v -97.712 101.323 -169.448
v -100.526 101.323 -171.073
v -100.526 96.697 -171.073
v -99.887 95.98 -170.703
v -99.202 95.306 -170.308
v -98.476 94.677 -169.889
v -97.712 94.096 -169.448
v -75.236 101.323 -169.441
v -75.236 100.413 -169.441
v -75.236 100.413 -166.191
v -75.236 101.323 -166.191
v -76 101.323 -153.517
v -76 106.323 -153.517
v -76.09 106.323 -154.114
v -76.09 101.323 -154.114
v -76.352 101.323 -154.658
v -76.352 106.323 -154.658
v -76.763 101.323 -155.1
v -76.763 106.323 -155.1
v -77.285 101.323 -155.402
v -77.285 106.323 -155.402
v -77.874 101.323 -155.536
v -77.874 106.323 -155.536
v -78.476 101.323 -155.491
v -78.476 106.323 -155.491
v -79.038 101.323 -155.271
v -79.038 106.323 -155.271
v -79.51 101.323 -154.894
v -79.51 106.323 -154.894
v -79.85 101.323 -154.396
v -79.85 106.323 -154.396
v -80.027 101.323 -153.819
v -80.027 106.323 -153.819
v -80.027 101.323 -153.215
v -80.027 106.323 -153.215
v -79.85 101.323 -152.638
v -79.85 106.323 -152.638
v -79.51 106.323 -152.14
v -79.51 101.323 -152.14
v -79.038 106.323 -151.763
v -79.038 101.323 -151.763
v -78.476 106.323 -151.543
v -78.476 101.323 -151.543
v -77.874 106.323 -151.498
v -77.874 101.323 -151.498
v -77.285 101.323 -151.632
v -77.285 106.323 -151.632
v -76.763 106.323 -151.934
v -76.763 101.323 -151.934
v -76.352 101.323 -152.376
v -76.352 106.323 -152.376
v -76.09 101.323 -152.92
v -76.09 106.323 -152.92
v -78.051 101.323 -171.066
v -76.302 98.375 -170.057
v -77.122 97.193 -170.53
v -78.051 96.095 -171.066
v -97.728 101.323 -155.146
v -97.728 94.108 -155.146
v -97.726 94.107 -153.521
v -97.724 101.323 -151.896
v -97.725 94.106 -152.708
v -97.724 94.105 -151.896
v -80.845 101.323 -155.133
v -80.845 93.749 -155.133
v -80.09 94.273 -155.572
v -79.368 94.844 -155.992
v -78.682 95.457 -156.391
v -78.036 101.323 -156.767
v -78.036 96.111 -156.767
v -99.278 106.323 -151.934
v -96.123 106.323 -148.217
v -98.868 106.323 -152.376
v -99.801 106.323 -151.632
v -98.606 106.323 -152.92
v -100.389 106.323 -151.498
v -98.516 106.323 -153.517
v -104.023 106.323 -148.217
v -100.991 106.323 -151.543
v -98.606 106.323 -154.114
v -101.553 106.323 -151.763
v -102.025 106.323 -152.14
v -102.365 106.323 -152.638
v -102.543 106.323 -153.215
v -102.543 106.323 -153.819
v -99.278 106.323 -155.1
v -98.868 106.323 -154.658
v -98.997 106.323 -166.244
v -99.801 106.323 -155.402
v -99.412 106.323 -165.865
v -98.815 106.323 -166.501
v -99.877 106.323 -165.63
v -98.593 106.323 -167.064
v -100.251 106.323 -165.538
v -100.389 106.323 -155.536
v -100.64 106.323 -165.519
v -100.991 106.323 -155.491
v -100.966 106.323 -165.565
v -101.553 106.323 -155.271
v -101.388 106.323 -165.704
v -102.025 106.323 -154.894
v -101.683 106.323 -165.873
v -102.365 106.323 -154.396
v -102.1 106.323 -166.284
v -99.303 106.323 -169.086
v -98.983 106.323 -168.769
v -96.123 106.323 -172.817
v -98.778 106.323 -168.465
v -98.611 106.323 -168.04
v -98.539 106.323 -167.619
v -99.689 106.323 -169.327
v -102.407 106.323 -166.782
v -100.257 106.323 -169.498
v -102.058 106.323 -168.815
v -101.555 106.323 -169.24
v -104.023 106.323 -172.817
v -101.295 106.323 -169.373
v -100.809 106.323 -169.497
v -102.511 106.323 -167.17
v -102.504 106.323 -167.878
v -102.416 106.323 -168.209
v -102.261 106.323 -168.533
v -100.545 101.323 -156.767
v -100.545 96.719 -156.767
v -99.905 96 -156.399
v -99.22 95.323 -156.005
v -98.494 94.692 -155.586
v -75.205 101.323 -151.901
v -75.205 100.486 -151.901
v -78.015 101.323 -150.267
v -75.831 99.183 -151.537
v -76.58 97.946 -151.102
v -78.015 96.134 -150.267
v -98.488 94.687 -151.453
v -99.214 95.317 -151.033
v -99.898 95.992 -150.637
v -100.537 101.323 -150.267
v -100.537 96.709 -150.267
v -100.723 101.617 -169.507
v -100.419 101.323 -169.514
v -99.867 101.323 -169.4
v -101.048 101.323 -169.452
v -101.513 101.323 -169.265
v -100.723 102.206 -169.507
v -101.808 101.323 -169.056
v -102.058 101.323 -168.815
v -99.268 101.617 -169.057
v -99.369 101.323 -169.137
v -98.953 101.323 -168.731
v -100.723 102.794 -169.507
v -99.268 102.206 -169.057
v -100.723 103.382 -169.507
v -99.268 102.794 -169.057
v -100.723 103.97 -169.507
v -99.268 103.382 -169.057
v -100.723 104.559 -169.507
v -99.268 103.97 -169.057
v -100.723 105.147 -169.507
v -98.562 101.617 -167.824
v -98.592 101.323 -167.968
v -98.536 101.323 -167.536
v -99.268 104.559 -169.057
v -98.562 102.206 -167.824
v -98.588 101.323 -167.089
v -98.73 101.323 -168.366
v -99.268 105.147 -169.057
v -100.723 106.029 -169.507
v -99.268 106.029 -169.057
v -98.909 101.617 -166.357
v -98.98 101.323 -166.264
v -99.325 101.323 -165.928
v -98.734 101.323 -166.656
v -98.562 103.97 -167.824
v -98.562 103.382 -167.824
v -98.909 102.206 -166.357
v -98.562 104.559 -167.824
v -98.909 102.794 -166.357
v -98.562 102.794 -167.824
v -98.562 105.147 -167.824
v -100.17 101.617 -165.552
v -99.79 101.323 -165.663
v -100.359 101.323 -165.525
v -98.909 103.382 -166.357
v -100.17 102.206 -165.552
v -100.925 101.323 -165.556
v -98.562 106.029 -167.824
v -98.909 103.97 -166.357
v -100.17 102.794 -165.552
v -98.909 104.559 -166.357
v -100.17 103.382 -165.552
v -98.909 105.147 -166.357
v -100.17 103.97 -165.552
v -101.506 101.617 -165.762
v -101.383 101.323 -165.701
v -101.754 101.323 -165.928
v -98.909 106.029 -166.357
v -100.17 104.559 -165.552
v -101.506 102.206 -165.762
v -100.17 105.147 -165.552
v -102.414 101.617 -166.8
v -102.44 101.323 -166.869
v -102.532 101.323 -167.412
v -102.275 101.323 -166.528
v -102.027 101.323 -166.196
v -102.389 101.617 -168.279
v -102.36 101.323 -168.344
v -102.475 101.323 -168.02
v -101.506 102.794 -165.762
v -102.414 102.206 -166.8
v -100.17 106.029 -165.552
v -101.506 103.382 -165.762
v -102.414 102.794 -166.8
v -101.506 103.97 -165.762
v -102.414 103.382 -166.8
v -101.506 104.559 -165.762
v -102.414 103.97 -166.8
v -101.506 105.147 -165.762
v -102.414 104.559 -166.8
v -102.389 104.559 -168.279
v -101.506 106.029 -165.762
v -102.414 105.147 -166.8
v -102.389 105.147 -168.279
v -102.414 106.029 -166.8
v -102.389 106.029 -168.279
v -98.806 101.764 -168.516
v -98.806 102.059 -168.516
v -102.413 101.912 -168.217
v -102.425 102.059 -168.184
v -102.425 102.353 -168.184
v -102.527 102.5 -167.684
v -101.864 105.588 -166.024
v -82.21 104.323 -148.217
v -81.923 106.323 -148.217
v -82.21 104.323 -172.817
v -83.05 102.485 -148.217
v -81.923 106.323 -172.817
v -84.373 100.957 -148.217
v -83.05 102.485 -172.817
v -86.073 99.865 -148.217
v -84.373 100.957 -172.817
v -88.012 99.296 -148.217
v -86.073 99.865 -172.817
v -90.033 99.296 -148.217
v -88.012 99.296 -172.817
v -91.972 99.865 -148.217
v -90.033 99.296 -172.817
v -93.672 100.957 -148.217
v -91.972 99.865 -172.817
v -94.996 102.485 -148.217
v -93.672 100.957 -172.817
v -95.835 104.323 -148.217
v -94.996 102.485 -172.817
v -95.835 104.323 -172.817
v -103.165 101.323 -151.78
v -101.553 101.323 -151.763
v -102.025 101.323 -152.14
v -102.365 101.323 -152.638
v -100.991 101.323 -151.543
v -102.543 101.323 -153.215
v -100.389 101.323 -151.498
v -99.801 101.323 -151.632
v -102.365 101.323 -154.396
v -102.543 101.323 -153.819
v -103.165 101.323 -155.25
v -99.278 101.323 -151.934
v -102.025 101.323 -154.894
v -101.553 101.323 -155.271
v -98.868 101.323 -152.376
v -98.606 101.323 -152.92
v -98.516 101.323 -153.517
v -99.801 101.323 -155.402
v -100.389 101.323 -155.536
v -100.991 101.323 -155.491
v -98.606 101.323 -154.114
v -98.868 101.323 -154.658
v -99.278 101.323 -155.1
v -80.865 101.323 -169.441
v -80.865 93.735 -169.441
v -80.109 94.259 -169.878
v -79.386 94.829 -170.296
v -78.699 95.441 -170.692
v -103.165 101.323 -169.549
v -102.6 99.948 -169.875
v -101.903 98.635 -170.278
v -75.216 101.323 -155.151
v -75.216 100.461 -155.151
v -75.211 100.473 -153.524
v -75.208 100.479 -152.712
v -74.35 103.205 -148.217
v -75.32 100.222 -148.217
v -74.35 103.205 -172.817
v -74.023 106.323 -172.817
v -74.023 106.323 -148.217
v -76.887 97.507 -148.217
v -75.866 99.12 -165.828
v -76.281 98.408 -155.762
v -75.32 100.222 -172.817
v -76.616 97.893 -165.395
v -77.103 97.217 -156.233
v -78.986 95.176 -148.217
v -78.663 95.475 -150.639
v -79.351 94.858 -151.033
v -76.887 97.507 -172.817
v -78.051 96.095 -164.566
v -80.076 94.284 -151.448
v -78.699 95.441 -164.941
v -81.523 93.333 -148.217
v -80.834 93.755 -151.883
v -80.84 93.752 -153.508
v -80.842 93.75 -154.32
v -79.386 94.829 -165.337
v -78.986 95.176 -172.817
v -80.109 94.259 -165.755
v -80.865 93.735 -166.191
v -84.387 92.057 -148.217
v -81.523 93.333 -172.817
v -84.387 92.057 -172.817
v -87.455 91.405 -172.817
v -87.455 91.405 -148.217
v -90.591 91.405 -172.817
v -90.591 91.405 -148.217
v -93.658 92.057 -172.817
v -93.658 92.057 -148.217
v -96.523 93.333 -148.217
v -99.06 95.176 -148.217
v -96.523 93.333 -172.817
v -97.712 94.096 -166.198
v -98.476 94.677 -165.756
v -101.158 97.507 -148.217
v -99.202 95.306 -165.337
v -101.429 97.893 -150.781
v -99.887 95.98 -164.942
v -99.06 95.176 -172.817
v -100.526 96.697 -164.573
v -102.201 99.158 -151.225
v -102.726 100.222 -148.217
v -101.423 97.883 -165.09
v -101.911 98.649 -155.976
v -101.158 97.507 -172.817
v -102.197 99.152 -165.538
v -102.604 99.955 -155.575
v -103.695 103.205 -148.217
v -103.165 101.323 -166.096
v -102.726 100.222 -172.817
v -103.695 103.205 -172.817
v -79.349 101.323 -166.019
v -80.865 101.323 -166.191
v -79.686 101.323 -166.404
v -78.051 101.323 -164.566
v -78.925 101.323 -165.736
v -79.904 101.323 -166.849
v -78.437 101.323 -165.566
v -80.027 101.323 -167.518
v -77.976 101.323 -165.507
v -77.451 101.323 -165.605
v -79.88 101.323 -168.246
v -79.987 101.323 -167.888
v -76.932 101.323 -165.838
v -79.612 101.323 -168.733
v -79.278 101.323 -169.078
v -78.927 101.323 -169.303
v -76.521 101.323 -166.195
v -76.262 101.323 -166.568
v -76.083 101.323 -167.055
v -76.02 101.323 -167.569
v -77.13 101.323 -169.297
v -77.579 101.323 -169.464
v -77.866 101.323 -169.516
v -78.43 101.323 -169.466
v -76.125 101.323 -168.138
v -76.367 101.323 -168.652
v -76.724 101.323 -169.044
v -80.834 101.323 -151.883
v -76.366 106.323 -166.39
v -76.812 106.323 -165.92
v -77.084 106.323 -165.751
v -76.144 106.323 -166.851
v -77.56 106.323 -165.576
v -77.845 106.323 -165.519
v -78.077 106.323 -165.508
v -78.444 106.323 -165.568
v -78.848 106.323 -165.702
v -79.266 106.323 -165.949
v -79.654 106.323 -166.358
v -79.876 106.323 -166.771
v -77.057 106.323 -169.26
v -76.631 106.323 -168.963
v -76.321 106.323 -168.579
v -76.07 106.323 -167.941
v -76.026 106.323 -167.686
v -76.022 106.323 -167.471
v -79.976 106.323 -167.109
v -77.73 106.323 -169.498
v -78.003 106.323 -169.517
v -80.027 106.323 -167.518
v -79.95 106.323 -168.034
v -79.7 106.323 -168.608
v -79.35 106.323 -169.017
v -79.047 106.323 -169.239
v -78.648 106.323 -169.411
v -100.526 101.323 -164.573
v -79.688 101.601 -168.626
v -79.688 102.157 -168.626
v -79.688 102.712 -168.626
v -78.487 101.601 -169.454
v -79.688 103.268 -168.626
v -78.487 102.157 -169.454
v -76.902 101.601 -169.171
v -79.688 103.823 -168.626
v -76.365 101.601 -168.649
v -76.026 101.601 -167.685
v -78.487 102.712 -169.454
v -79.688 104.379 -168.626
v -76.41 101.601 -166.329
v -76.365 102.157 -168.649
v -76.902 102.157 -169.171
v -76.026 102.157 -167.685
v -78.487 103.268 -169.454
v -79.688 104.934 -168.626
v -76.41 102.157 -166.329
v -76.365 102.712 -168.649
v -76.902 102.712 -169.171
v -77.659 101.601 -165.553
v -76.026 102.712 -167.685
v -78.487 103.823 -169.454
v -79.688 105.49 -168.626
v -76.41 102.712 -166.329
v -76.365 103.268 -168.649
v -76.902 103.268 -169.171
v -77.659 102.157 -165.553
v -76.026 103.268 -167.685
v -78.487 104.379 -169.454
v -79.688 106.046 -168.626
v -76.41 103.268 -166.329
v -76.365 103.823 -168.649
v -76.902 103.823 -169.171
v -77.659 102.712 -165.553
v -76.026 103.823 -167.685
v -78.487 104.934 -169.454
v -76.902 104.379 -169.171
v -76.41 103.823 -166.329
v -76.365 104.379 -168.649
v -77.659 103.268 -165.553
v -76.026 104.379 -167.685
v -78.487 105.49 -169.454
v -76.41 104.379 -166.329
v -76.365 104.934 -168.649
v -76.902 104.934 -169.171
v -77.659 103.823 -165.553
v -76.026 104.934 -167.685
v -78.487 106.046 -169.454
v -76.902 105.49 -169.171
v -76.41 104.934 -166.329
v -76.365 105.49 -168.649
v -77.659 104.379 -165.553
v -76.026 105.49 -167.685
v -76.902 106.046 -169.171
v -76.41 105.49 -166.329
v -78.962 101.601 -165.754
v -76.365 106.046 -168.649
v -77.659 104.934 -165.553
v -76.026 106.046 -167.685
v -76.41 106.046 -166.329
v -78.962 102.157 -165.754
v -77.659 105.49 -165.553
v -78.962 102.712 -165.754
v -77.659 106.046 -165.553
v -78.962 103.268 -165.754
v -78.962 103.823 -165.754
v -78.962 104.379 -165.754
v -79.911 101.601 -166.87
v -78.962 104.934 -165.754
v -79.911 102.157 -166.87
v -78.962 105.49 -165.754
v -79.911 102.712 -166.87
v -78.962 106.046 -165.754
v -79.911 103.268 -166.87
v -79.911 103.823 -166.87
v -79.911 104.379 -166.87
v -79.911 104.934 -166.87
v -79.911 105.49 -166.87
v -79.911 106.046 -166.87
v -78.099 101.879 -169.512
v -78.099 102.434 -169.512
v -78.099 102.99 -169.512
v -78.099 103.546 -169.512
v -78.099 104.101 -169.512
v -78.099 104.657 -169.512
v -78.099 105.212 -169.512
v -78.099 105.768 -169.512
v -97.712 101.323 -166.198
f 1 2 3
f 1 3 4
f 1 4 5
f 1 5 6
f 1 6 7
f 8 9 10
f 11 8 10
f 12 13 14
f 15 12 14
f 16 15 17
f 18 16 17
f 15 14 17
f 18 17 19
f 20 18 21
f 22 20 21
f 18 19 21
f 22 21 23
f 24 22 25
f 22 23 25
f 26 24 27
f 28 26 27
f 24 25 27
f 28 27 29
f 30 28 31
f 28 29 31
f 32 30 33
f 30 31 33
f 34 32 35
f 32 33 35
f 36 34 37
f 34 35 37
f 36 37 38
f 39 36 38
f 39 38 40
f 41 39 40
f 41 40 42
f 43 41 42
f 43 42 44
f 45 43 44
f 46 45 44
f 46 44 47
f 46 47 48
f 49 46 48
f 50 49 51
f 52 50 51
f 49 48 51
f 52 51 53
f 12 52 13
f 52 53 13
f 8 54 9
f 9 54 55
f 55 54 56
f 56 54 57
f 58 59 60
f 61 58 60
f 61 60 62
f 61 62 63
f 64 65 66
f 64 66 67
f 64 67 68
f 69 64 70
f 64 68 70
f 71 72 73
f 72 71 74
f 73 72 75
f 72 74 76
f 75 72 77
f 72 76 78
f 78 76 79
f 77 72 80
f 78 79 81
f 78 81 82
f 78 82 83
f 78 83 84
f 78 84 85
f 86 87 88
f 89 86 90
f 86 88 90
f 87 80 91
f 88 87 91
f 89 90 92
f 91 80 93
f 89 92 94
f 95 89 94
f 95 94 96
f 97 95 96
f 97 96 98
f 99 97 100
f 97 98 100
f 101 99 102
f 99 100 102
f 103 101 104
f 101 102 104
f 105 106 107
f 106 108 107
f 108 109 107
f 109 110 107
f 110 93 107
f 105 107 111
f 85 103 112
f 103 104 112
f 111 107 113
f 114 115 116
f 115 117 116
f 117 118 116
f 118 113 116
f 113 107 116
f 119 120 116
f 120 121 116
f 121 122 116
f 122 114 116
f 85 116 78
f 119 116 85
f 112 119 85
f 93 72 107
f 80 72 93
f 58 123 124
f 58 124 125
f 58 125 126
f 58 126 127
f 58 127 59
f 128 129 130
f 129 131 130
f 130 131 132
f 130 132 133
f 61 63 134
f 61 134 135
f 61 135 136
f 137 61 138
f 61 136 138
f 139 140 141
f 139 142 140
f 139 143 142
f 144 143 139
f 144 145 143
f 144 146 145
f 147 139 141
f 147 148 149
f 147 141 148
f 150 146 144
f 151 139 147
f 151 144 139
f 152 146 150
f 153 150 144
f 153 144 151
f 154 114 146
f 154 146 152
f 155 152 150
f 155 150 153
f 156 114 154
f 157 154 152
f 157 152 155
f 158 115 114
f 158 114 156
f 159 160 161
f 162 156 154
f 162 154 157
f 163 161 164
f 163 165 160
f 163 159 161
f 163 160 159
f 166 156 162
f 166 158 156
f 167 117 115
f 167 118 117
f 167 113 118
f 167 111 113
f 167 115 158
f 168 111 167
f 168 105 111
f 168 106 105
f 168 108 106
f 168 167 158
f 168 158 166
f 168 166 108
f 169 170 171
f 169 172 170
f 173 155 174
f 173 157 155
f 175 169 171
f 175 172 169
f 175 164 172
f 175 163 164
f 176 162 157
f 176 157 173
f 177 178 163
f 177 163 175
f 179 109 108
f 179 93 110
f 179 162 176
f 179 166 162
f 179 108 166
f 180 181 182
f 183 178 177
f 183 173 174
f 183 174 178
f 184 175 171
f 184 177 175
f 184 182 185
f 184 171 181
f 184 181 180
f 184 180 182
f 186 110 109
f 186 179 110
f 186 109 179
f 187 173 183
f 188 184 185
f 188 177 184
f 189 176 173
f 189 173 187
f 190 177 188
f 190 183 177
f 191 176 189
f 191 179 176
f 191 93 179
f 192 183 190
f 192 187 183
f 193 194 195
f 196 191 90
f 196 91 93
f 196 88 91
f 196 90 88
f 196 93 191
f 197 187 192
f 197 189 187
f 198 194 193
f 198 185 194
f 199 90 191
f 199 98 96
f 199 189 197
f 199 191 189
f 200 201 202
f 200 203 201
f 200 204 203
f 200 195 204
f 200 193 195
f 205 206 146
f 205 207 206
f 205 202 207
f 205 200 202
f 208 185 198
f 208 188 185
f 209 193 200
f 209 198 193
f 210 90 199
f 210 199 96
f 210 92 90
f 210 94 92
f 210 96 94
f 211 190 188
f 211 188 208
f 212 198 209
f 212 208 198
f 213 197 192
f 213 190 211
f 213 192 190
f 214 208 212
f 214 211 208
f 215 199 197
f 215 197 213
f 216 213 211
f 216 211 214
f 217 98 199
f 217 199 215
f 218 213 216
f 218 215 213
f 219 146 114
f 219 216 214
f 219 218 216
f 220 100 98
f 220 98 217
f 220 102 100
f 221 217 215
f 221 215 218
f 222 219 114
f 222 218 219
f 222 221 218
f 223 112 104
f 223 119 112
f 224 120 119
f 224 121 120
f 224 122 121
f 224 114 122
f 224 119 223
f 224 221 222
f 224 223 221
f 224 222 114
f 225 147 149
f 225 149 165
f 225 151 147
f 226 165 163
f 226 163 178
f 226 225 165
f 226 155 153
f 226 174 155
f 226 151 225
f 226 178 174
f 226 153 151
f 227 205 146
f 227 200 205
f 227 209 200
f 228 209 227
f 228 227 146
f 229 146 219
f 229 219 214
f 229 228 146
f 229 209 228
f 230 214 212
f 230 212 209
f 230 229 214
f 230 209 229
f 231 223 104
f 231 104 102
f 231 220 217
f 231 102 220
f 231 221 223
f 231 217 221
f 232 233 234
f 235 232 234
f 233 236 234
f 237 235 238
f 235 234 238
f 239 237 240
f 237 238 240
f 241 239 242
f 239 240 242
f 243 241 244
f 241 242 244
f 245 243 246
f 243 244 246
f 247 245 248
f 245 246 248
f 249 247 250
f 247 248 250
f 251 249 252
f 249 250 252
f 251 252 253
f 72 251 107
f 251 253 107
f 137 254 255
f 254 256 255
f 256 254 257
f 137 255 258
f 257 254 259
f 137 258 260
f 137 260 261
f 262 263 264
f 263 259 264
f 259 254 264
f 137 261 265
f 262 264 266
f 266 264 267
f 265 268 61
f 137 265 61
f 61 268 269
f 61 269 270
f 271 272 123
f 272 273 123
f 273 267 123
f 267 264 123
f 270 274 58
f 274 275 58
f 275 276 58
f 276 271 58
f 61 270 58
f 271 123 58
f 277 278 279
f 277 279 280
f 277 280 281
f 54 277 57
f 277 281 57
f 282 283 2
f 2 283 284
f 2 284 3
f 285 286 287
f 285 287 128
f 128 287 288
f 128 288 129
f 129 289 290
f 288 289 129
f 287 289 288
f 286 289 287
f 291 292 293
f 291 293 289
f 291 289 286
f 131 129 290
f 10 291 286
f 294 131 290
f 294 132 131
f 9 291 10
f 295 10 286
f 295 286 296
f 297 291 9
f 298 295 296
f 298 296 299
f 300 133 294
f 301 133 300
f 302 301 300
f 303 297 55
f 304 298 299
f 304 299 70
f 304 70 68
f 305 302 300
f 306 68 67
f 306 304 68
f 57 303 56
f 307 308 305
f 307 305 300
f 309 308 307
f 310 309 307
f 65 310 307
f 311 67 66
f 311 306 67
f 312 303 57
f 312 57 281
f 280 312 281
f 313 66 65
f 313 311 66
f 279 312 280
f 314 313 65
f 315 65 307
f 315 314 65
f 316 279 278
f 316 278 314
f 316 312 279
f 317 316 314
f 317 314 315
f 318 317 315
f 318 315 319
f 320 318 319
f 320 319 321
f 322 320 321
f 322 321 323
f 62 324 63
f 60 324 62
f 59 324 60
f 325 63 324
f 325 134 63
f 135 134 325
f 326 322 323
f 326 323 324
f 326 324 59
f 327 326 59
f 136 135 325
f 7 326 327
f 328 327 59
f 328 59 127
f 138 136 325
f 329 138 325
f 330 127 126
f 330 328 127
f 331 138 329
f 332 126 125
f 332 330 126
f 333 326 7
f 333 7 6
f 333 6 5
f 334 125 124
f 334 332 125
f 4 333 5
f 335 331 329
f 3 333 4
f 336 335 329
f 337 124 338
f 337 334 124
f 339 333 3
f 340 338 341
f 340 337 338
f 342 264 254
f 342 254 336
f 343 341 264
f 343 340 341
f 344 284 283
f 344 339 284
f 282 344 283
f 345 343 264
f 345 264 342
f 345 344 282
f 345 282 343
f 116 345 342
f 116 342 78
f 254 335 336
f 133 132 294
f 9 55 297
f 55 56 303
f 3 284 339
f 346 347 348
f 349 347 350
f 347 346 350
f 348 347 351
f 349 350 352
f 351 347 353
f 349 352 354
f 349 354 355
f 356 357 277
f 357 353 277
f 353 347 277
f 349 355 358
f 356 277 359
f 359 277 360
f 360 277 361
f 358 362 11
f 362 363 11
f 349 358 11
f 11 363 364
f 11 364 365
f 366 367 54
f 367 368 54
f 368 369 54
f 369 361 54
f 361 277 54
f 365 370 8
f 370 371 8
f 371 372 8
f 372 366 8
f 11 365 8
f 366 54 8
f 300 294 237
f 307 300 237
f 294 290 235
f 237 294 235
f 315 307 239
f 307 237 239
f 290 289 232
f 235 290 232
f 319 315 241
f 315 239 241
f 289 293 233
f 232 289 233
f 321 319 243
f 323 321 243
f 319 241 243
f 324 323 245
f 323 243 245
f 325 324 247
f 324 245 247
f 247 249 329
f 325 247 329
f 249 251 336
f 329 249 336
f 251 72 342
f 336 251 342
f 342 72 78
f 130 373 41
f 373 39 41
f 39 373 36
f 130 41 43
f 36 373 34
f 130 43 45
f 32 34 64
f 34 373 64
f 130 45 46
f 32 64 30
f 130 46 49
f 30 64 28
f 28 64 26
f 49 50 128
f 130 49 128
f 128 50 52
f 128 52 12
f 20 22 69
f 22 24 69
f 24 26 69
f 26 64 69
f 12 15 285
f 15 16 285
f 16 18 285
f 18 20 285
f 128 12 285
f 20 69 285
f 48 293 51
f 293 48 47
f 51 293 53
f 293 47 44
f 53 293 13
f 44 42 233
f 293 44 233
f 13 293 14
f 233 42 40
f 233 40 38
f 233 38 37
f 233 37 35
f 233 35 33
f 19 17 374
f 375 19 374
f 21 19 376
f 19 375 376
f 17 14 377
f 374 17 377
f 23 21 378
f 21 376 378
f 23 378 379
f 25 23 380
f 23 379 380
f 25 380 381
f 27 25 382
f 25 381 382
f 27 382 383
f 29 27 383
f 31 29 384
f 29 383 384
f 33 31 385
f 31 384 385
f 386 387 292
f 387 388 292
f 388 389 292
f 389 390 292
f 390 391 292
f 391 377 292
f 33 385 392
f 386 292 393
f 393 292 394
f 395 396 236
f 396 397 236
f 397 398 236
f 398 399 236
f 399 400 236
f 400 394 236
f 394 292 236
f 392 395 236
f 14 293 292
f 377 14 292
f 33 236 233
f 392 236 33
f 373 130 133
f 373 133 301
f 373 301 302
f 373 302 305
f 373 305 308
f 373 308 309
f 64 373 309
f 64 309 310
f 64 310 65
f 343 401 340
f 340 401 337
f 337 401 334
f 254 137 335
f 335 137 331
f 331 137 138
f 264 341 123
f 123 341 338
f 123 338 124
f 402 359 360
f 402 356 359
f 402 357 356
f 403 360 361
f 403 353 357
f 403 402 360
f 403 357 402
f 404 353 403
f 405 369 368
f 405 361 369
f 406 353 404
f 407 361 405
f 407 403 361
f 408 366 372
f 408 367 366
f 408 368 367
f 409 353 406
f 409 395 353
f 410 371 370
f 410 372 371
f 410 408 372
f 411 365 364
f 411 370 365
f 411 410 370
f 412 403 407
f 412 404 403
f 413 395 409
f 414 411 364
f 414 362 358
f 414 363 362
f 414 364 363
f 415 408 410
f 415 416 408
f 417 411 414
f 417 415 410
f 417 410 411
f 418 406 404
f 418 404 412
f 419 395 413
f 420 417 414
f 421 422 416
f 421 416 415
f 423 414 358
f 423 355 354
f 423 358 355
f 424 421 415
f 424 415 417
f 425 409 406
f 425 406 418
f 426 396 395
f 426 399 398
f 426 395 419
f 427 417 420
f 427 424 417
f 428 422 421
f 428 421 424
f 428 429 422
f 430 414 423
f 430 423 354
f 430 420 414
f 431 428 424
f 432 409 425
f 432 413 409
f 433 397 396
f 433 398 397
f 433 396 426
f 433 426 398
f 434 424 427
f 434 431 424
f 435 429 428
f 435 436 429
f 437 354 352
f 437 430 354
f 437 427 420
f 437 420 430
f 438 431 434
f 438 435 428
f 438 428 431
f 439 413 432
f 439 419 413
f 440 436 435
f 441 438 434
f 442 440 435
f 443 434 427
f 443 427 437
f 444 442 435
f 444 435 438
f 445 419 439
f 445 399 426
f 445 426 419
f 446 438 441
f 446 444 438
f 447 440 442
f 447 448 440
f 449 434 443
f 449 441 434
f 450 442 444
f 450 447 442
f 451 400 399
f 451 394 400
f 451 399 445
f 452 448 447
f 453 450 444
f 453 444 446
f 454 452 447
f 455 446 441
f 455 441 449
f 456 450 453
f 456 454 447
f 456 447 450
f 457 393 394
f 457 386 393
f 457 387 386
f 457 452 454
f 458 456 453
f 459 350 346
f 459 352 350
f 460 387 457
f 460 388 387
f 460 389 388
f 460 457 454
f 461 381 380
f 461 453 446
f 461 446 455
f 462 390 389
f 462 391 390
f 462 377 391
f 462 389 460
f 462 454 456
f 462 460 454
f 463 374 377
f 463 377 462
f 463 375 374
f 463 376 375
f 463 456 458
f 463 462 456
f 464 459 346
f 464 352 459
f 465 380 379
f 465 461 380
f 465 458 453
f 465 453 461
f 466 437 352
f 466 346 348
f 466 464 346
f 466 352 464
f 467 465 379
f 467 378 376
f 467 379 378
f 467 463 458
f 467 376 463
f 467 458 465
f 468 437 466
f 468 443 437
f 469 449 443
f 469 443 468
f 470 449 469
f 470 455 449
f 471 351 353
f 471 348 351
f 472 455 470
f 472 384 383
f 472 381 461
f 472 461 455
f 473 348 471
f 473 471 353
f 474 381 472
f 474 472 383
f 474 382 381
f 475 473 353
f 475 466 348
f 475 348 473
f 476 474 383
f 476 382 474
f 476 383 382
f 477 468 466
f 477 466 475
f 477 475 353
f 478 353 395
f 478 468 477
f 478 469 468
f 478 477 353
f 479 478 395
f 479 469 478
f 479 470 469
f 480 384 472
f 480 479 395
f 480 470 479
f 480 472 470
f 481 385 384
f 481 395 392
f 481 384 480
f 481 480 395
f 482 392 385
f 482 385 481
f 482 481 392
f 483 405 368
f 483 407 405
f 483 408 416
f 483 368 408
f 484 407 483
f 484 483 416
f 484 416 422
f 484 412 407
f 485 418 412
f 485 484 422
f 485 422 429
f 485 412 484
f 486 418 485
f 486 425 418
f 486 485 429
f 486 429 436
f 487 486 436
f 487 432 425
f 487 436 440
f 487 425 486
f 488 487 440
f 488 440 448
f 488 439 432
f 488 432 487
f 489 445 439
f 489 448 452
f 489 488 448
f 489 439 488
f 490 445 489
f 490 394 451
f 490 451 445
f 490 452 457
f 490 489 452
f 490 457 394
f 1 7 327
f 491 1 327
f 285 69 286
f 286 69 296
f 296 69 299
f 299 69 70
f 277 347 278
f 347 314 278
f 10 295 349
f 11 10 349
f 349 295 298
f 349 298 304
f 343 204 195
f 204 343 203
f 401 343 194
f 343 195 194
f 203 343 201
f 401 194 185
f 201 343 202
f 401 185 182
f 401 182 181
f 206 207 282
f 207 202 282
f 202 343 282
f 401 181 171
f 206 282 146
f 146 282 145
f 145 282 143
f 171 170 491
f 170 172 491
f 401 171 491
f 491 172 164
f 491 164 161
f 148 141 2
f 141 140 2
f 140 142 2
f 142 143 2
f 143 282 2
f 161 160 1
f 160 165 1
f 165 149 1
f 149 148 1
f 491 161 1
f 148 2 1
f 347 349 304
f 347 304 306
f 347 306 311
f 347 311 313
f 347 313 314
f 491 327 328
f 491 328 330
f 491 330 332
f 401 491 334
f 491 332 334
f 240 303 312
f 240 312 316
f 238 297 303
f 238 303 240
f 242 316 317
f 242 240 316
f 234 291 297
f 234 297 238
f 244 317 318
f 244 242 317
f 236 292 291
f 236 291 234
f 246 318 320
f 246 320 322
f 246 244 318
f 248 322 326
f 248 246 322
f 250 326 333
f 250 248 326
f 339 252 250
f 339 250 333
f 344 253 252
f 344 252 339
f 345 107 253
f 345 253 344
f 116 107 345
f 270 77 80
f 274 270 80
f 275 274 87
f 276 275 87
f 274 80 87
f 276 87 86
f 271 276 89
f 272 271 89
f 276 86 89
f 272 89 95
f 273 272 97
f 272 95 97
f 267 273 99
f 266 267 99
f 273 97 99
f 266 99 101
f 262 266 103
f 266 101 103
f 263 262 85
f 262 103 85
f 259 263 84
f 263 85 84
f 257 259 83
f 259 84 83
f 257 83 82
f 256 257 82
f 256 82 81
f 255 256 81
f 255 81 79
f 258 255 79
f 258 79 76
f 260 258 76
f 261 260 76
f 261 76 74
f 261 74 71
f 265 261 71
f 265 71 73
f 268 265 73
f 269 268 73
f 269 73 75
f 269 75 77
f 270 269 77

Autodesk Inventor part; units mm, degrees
ref_plane "YZ Plane" through (0, 0, 0) normal (1, 0, 0) x (0, 1, 0)
ref_plane "XZ Plane" through (0, 0, 0) normal (0, 1, 0) x (-1, 0, 0)
sketch "Эскиз1" plane through (-89.0227, 116.8233, -154.317) normal (0, 0, -1) x (-1, 0, 0)
  arc A0 (7.1, -10.5) -> (-7.1, -10.5) centre (0, -10.5) ccw projected
  line L0 (7.1, -10.5) -> (15, -10.5) projected
  line L1 (15, -10.5) -> (15, 7.5) projected
  line L2 (15, 7.5) -> (17, 7.5) projected
  line L3 (20, 10.5) -> (-20, 10.5) projected
  line L4 (-17, 7.5) -> (-15, 7.5) projected
  line L5 (-15, 7.5) -> (-15, -10.5) projected
  line L6 (-15, -10.5) -> (-7.1, -10.5) projected
  circle A1 centre (0, -10.5) radius 15
  line L7 (15, -10.5) -> (-15, -10.5)
  circle A2 centre (0, -10.5) radius 7 projected
  circle A3 centre (0, -10.5) radius 7.1
  line L8 (15, -10.5) -> (-15, -10.5)
  line L9 (20, 10.5) -> (17, 7.5) projected
  line L10 (-17, 7.5) -> (-20, 10.5) projected
  point P0 (-89.0227, -116.8233)
  point P1 (-7.1, -10.5)
extrude "Выдавливание1" add sketch "Эскиз1" against normal blind 6.1 contours L0 A1 L6 A3
ref_plane "РабПлоскость2" through (-89.2672, 127.3233, -149.317) normal (0, -1, 0) x (1, 0, 0)
ref_plane "РабПлоскость3" through (-89.0227, 91.3233, -154.317) normal (0, 1, 0) x (1, 0, 0)
sketch "Эскиз3" plane through (-89.2672, 127.3233, -149.317) normal (0, -1, 0) x (1, 0, 0)
  point P0 (89.2672, 149.317)
sketch "Эскиз4" plane through (-89.0227, 91.3233, -154.317) normal (0, 1, 0) x (1, 0, 0)
  circle A0 centre (-11.518, -0.8) radius 2.025
  circle A1 centre (10.9976, -0.8) radius 2.025
  circle A2 centre (10.9976, -0.8) radius 3.25
  line L0 (8.1777, 0.8159) -> (10.987, 2.45)
  line L1 (10.987, 2.45) -> (13.8069, 0.8341)
  line L2 (13.8069, 0.8341) -> (13.8174, -2.4159)
  line L3 (13.8174, -2.4159) -> (11.0081, -4.05)
  line L4 (11.0081, -4.05) -> (8.1883, -2.4341)
  line L5 (8.1883, -2.4341) -> (8.1777, 0.8159)
  circle A3 centre (-11.518, -0.8) radius 3.25
  line L6 (-14.3346, 0.8215) -> (-11.5221, 2.45)
  line L7 (-11.5221, 2.45) -> (-8.7055, 0.8285)
  line L8 (-8.7055, 0.8285) -> (-8.7014, -2.4215)
  line L9 (-8.7014, -2.4215) -> (-11.514, -4.05)
  line L10 (-11.514, -4.05) -> (-14.3306, -2.4285)
  line L11 (-14.3306, -2.4285) -> (-14.3346, 0.8215)
  point P0 (89.0227, -154.317)
  point P1 (-9.5168, -5)
  point P2 (-13.3499, -5.8)
  dimension "d19" = 6.5
sketch "Эскиз5" plane through (-89.0227, 116.8233, -154.317) normal (0, 0, -1) x (-1, 0, 0)
  arc A0 (-15, -10.5) -> (15, -10.5) centre (0, -10.5) ccw projected
  arc A1 (-7.1, -10.5) -> (7.1, -10.5) centre (0, -10.5) ccw projected
  line L0 (-7.1, -10.5) -> (-15, -10.5) projected
  line L1 (15, -10.5) -> (7.1, -10.5) projected
  point P0 (-89.0227, -116.8233)
ref_plane "РабПлоскость4" through (-119.2672, 76.6183, -172.817) normal (0, 0, 1) x (1, 0, 0)
extrude "Выдавливание5" add sketch "Эскиз5" along normal up to surface (18.5 mm away)
sketch "Эскиз6" plane through (-81.9227, 106.3233, -148.217) normal (0, 1, 0) x (1, 0, 0)
  spline S0 degree 3 poles (3.9004, 2.9999) (3.7245, 2.9999) (3.4489, 3.0214) (2.9324, 3.2367) (2.7005, 3.3696) (2.2383, 3.836) (2.1143, 4.0825) (1.9216, 4.5561) (1.8983, 4.8272) (1.9018, 5.2007) (1.9271, 5.4608) (2.115, 5.9172) (2.2283, 6.1414) (2.6589, 6.5988) (2.8813, 6.7317) (3.3428, 6.9462) (3.5921, 6.9833) (3.938, 7.0077) (4.1964, 7.0052) (4.7621, 6.8239) (4.993, 6.6978) (5.3793, 6.3686) (5.5529, 6.1613) (5.836, 5.6049) (5.8802, 5.3338) (5.9139, 4.8965) (5.8839, 4.6393) (5.7537, 4.2295) (5.6627, 4.0097) (5.3189, 3.5657) (5.1225, 3.3931) (4.7049, 3.1558) (4.5337, 3.0993) (4.2495, 3.0231) (4.0752, 3) (3.9004, 2.9999) knots 0 0 0 0 0.05278 0.05278 0.086326 0.086326 0.123204 0.123204 0.191125 0.191125 0.256265 0.256265 0.291032 0.291032 0.325738 0.325738 0.381328 0.381328 0.440927 0.440927 0.488647 0.488647 0.532429 0.532429 0.584012 0.584012 0.657631 0.657631 0.707027 0.707027 0.750679 0.750679 0.786548 0.786548 0.838987 0.838987 0.838987 0.838987 projected
  line L0 (7.9, 0) -> (7.9, 10) projected
  line L1 (7.9, 28.5) -> (7.9, 10) projected
  spline S1 degree 3 poles (-18.6169, 3) (-18.8661, 3) (-19.1174, 3.0465) (-19.5436, 3.2165) (-19.7767, 3.3398) (-20.1687, 3.7191) (-20.3359, 3.938) (-20.5737, 4.4851) (-20.6126, 4.7587) (-20.621, 5.202) (-20.5814, 5.4471) (-20.4, 5.9515) (-20.2582, 6.1524) (-19.9577, 6.5137) (-19.7534, 6.6562) (-19.3614, 6.8745) (-19.1056, 6.9583) (-18.5778, 7.0163) (-18.3108, 6.9948) (-17.7812, 6.8389) (-17.5504, 6.709) (-17.1606, 6.3952) (-16.9882, 6.1918) (-16.7635, 5.7779) (-16.6604, 5.5273) (-16.5953, 4.8865) (-16.6419, 4.6209) (-16.754, 4.2513) (-16.8422, 4.0327) (-17.1223, 3.6603) (-17.294, 3.4644) (-17.7748, 3.1712) (-17.9576, 3.1063) (-18.2654, 3.0232) (-18.4408, 3) (-18.6169, 3) knots 0 0 0 0 0.074777 0.074777 0.132907 0.132907 0.176214 0.176214 0.221242 0.221242 0.273328 0.273328 0.334855 0.334855 0.445019 0.445019 0.599494 0.599494 0.747069 0.747069 0.901689 0.901689 1.065475 1.065475 1.190217 1.190217 1.309721 1.309721 1.411319 1.411319 1.472242 1.472242 1.514996 1.514996 1.5678 1.5678 1.5678 1.5678 projected
  spline S2 degree 3 poles (1.8953, 19.3009) (1.8944, 19.3863) (1.8996, 19.5644) (2.0298, 20.0176) (2.1169, 20.2293) (2.4403, 20.7217) (2.6648, 20.8786) (2.9132, 21.0563) (3.1329, 21.1685) (3.5962, 21.2734) (3.8627, 21.3137) (4.1292, 21.2939) (4.4485, 21.2503) (5.0812, 20.9371) (5.2298, 20.8085) (5.5261, 20.5131) (5.6407, 20.3138) (5.8212, 19.8892) (5.8776, 19.6525) (5.9089, 19.3478) (5.9108, 19.063) (5.6799, 18.3006) (5.5185, 18.1178) (5.3603, 17.9264) (5.2248, 17.7844) (4.7267, 17.4265) (4.3507, 17.3562) (3.9904, 17.2726) (3.8261, 17.2836) (3.4517, 17.3475) (3.1747, 17.4305) (2.784, 17.6252) (2.5802, 17.7693) (2.1778, 18.2343) (2.0816, 18.439) (1.9561, 18.8227) (1.8978, 19.0803) (1.8953, 19.3009) knots -0.617581 -0.617581 -0.617581 -0.617581 -0.591947 -0.591947 -0.573073 -0.573073 -0.540222 -0.540222 -0.491682 -0.491682 -0.466072 -0.466072 -0.460987 -0.460987 -0.456841 -0.456841 -0.449459 -0.449459 -0.440712 -0.440712 -0.435051 -0.435051 -0.427631 -0.427631 -0.418066 -0.418066 -0.393854 -0.393854 -0.318016 -0.318016 -0.225773 -0.225773 -0.149383 -0.149383 -0.066183 -0.066183 0 0 0 0
  spline S3 degree 3 poles (-20.1358, 20.5982) (-19.9784, 20.7756) (-19.7373, 20.9815) (-19.2566, 21.217) (-19.0243, 21.2678) (-18.5989, 21.3096) (-18.3448, 21.3092) (-17.7198, 21.1156) (-17.5007, 20.9708) (-17.0322, 20.5784) (-16.879, 20.2945) (-16.7767, 20.0958) (-16.6834, 19.8667) (-16.6099, 19.4343) (-16.5909, 19.1881) (-16.7143, 18.6599) (-16.8009, 18.3991) (-17.121, 17.9518) (-17.3048, 17.7698) (-17.7894, 17.4486) (-18.0589, 17.3712) (-18.5717, 17.273) (-18.8341, 17.303) (-19.1764, 17.3757) (-19.3925, 17.4419) (-19.6812, 17.5968) (-19.8978, 17.7223) (-20.2684, 18.178) (-20.4032, 18.3633) (-20.5197, 18.6522) (-20.6106, 18.8835) (-20.6111, 19.6503) (-20.535, 19.8971) (-20.3432, 20.3552) (-20.1819, 20.5462) (-20.1358, 20.5982) knots -1.840358 -1.840358 -1.840358 -1.840358 -1.769222 -1.769222 -1.709875 -1.709875 -1.656566 -1.656566 -1.604902 -1.604902 -1.500987 -1.500987 -1.176684 -1.176684 -0.960047 -0.960047 -0.825926 -0.825926 -0.728108 -0.728108 -0.603604 -0.603604 -0.389887 -0.389887 -0.189621 -0.189621 -0.087541 -0.087541 -0.045854 -0.045854 -0.032602 -0.032602 -0.020855 -0.020855 0 0 0 0
  point P0 (81.9227, -148.217)
  point P1 (3.9004, 2.9999)
  point P2 (7.9, 14.25)
  point P3 (-18.6169, 3)
extrude "Выдавливание6" cut sketch "Эскиз6" against normal blind 21.25 contours S2 | S3
extrude "Выдавливание3" cut sketch "Эскиз4" along normal blind 10 contours A0 | A1 | L2 L3 L4 L5 L0 L1 | L8 L9 L10 L11 L6 L7
sketch "Эскиз7" plane through (-89.0227, 91.3233, -154.317) normal (0, 1, 0) x (1, 0, 0)
  line L0 (13.7865, -5.8) -> (13.7865, -3.3744) projected
  line L1 (13.7865, -3.3744) -> (10.9719, -1.7494) projected
  line L2 (10.9719, -1.7494) -> (8.1574, -3.3744) projected
  line L3 (8.1574, -3.3744) -> (8.1574, -5.8) projected
  line L4 (8.1574, -6.6244) -> (10.9719, -8.2494) projected
  line L5 (10.9719, -8.2494) -> (13.7865, -6.6244) projected
  line L6 (-14.1421, -3.2792) -> (-14.1421, -5.8) projected
  line L7 (-11.5035, -1.7558) -> (-14.1421, -3.2792) projected
  line L8 (-8.689, -3.3808) -> (-11.5035, -1.7558) projected
  line L9 (-8.689, -5.8) -> (-8.689, -3.3808) projected
  line L10 (-11.5035, -8.2558) -> (-8.689, -6.6308) projected
  line L11 (-14.1421, -6.7324) -> (-11.5035, -8.2558) projected
  line L12 (-15, -6.1) -> (-15, 18.5) projected
  line L13 (-15, 4.25) -> (5.6318, 4.25)
  line L14 (13.7865, 15.1244) -> (13.7865, 11.8744)
  line L15 (13.7865, 11.8744) -> (10.9719, 10.2494)
  line L16 (10.9719, 10.2494) -> (8.1574, 11.8744)
  line L17 (8.1574, 11.8744) -> (8.1574, 15.1244)
  line L18 (8.1574, 15.1244) -> (10.9719, 16.7494)
  line L19 (10.9719, 16.7494) -> (13.7865, 15.1244)
  line L20 (-14.1421, 11.7792) -> (-14.1421, 15.2324)
  line L21 (-11.5035, 10.2558) -> (-14.1421, 11.7792)
  line L22 (-8.689, 11.8808) -> (-11.5035, 10.2558)
  line L23 (-8.689, 15.1308) -> (-8.689, 11.8808)
  line L24 (-11.5035, 16.7558) -> (-8.689, 15.1308)
  line L25 (-14.1421, 15.2324) -> (-11.5035, 16.7558)
  point P0 (89.0227, -154.317)
  point P1 (-11.5169, 15.5)
  point P2 (11.0004, 15.5001)
  point P3 (-9.3627, -7.088)
  point P4 (-9.3627, 15.588)
  point P5 (-13.3496, 18.5)
  point P6 (-9.686, 18.5)
  point P7 (9.1713, 18.5)
  point P8 (12.8315, 18.5)
  dimension "d16" = 14.25
extrude "Выдавливание7" cut sketch "Эскиз7" along normal up to surface (10 mm away)
sketch "Эскиз2" plane through (-89.2672, 127.3233, -149.317) normal (0, -1, 0) x (1, 0, 0)
  line L0 (-14.7555, -5) -> (15.2445, -5) projected
  line L1 (15.2445, -5) -> (15.2445, 1.1) projected
  line L2 (-6.8555, 1.1) -> (7.3445, 1.1) projected
  line L3 (-0.0139, 1.1) -> (-0.0139, -5)
  circle A0 centre (-11.2735, -4.2) radius 2.025
  circle A1 centre (11.2421, -4.2) radius 2.025
  point P0 (89.2672, 149.317)
extrude "Выдавливание8" cut sketch "Эскиз2" along normal blind 51.5
properties part number "верх штуки для подшипников"
